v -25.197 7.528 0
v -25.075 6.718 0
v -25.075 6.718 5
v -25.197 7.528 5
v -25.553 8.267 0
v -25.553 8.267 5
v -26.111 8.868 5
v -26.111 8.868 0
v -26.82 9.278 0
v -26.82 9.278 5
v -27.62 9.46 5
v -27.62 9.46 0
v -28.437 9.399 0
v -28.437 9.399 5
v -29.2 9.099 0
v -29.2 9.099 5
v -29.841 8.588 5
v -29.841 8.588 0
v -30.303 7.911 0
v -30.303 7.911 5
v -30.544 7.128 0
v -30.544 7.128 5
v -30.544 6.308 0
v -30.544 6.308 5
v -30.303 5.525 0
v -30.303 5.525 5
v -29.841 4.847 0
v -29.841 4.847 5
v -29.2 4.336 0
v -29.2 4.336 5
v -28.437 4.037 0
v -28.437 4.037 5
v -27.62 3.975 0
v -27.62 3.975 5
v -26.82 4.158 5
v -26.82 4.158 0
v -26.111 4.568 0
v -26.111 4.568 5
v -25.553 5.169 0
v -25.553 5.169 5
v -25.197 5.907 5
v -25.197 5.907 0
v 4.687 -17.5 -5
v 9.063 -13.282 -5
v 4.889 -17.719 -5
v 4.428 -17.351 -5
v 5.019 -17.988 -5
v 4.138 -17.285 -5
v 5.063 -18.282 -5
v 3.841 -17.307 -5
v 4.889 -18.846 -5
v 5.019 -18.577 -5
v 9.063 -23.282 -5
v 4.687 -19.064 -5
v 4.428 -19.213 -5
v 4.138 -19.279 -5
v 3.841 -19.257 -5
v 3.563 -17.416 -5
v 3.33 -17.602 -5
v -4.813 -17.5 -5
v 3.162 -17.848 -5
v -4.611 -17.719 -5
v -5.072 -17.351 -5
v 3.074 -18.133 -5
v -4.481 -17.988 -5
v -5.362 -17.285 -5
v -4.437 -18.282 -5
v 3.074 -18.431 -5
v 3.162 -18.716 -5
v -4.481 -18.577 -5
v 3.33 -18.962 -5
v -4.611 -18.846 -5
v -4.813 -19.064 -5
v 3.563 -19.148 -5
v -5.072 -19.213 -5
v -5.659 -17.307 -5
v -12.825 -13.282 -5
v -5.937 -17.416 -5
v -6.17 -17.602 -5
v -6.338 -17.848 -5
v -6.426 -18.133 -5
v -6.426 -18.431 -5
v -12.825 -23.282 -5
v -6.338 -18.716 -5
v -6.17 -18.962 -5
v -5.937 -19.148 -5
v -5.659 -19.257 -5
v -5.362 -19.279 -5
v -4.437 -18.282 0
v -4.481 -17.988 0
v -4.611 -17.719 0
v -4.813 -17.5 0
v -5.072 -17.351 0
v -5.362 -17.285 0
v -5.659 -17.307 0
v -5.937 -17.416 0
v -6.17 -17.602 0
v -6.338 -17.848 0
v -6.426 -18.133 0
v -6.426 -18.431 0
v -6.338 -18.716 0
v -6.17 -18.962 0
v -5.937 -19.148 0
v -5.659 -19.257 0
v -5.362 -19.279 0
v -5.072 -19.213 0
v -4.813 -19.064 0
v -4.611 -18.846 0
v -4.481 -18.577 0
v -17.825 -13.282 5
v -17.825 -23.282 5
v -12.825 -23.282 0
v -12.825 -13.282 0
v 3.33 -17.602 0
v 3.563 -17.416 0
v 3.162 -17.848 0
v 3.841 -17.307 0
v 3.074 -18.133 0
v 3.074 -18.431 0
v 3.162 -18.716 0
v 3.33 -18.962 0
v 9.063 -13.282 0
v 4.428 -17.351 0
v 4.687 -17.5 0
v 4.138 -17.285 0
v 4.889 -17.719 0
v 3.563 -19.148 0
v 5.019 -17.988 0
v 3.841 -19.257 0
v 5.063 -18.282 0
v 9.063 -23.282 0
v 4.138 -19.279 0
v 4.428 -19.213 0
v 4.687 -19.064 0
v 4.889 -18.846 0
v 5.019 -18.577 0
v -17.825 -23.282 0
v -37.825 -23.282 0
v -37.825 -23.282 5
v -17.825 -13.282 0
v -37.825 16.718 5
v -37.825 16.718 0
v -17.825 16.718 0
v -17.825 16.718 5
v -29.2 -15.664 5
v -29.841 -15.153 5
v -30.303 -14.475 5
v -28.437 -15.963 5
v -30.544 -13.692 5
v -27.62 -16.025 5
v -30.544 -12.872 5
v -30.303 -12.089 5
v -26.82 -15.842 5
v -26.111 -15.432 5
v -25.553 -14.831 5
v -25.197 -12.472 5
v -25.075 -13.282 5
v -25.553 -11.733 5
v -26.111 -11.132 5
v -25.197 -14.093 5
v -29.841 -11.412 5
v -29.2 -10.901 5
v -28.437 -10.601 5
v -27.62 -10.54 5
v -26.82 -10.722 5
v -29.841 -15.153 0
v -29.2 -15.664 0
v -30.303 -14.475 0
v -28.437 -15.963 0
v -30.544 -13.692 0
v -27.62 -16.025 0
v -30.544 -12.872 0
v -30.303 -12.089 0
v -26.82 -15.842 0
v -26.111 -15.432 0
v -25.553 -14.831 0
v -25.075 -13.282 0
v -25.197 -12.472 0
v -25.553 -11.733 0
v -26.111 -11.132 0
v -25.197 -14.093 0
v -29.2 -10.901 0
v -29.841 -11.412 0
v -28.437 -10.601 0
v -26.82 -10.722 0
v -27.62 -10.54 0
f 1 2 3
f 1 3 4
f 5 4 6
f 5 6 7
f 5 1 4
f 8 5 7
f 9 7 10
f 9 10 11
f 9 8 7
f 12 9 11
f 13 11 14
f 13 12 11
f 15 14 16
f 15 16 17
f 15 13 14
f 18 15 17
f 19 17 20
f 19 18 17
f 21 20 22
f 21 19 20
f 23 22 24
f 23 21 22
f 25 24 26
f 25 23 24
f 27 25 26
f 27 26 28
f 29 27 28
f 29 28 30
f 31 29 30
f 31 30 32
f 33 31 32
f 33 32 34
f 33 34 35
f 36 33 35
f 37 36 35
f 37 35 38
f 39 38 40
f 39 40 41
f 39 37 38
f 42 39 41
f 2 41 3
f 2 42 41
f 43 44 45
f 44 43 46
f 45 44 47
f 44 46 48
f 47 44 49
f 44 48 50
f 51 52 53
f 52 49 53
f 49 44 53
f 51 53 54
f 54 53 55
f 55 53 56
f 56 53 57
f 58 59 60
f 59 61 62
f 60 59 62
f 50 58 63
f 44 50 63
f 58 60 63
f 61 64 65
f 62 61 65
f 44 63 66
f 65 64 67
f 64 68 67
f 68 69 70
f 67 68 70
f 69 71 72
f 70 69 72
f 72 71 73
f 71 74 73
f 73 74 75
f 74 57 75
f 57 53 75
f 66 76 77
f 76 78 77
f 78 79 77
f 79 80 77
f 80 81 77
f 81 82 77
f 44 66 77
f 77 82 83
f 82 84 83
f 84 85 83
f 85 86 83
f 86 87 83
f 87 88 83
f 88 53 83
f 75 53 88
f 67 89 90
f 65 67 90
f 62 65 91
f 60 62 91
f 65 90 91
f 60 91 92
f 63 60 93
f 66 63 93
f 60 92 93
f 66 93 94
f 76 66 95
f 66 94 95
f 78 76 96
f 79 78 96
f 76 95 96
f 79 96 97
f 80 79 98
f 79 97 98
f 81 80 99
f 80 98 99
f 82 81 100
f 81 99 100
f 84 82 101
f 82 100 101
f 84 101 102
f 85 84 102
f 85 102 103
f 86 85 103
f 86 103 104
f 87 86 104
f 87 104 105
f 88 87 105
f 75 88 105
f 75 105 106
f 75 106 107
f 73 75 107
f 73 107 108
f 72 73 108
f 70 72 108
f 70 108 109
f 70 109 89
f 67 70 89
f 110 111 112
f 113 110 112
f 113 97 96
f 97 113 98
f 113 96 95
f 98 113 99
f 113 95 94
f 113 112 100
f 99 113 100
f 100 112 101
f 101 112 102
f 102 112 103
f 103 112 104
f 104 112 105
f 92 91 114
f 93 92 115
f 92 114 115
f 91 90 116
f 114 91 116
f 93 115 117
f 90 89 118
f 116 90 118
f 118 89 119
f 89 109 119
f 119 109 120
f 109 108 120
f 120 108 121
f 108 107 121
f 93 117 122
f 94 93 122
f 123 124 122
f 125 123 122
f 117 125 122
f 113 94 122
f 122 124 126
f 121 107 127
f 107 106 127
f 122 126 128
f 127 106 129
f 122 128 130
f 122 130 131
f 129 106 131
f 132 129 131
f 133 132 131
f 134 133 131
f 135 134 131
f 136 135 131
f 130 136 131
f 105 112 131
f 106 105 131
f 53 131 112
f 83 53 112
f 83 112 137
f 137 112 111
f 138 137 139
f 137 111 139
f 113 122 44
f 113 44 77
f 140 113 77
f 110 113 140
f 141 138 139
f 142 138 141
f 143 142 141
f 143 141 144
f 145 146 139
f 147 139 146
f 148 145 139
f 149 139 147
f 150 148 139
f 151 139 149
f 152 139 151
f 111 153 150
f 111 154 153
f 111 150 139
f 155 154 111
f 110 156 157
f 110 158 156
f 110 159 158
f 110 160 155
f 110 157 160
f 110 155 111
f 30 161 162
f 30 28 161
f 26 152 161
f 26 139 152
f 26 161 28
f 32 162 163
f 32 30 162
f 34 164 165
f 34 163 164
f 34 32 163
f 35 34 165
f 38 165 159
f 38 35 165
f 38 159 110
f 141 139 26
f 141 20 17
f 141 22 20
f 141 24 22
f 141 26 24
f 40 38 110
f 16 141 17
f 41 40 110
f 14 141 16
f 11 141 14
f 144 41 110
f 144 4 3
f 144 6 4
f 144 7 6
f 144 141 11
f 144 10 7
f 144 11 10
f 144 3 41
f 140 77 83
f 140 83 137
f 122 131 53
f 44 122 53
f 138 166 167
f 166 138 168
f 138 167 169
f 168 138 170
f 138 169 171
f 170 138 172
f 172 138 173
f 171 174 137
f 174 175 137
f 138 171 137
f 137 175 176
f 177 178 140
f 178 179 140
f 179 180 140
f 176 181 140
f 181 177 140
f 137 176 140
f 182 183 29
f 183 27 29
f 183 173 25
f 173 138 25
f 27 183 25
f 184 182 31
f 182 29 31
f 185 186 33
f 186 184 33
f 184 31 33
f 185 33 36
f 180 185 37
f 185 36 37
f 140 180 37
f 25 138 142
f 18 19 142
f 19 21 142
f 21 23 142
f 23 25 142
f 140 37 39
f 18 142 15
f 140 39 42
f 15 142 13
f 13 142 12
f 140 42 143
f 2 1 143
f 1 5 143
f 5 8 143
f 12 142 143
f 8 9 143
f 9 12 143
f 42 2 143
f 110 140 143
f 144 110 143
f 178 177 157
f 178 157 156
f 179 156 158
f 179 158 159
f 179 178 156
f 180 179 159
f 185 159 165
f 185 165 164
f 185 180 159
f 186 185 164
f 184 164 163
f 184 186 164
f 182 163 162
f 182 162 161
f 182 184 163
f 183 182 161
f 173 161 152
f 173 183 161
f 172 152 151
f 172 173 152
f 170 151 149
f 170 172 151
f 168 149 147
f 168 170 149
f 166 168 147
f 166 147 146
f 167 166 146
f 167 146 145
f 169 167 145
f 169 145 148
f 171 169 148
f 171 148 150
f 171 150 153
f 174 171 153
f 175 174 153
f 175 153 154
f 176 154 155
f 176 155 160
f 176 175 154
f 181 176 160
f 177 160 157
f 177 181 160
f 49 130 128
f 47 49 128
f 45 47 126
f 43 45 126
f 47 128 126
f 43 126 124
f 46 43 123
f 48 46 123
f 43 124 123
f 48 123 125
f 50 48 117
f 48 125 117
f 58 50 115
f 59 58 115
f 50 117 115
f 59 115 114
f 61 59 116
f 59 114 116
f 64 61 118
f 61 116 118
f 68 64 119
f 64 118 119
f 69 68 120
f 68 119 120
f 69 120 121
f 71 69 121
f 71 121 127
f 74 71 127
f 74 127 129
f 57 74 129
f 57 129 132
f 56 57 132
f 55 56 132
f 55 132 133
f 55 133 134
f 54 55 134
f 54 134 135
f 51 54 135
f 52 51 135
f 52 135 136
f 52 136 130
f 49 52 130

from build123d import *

# Parameters (mm, degrees)
ESQUISSE1_W             = 20
ESQUISSE1_H             = 40
ESQUISSE1_R             = 2.75
BOSS_EXTRU_1_DEPTH      = 5
BOSS_EXTRU_2_DEPTH      = 10
ENL_V_MAT_EXTRU_1_REACH = 46.697
ESQUISSE3_R             = 1


with BuildPart() as part:
    # Esquisse1 → Boss.-Extru.1 (new body)
    with BuildSketch(Plane.XY):
        with Locations((-27.825146679, -3.282272289)):
            Rectangle(ESQUISSE1_W, ESQUISSE1_H)
        with Locations((-27.825146679, 6.717727711)):
            Circle(ESQUISSE1_R, mode=Mode.SUBTRACT)
        with Locations((-27.825146679, -13.282272289)):
            Circle(ESQUISSE1_R, mode=Mode.SUBTRACT)
    extrude(amount=BOSS_EXTRU_1_DEPTH)

    # Esquisse2 → Boss.-Extru.2 (add)
    with BuildSketch(Plane.XZ.offset(23.282272289)):
        Polygon((-17.825146679, 0), (-17.825146679, 5), (-12.825146679, 0), (9.063128198, 0), (9.063128198, -5), (-12.825146679, -5), align=None)
    extrude(amount=-BOSS_EXTRU_2_DEPTH)

    # Esquisse3 → Enlèv. mat.-Extru.1 (cut, up to next)
    with BuildSketch(Plane.XY, mode=Mode.PRIVATE) as enl_v_mat_extru_1_sk1:
        with Locations((4.063128198, -18.282272289)):
            Circle(ESQUISSE3_R)
    enl_v_mat_extru_1_tool1 = extrude(enl_v_mat_extru_1_sk1.sketch, amount=-ENL_V_MAT_EXTRU_1_REACH, mode=Mode.PRIVATE) & part.part
    # Esquisse3 → Enlèv. mat.-Extru.1 (cut, up to next)
    with BuildSketch(Plane.XY, mode=Mode.PRIVATE) as enl_v_mat_extru_1_sk2:
        with Locations((-5.436871802, -18.282272289)):
            Circle(ESQUISSE3_R)
    enl_v_mat_extru_1_tool2 = extrude(enl_v_mat_extru_1_sk2.sketch, amount=-ENL_V_MAT_EXTRU_1_REACH, mode=Mode.PRIVATE) & part.part
    add(enl_v_mat_extru_1_tool1.solids().sort_by_distance((4.063128, -18.282272, 0))[0], mode=Mode.SUBTRACT)
    add(enl_v_mat_extru_1_tool2.solids().sort_by_distance((-5.436872, -18.282272, 0))[0], mode=Mode.SUBTRACT)


solid = part.part
